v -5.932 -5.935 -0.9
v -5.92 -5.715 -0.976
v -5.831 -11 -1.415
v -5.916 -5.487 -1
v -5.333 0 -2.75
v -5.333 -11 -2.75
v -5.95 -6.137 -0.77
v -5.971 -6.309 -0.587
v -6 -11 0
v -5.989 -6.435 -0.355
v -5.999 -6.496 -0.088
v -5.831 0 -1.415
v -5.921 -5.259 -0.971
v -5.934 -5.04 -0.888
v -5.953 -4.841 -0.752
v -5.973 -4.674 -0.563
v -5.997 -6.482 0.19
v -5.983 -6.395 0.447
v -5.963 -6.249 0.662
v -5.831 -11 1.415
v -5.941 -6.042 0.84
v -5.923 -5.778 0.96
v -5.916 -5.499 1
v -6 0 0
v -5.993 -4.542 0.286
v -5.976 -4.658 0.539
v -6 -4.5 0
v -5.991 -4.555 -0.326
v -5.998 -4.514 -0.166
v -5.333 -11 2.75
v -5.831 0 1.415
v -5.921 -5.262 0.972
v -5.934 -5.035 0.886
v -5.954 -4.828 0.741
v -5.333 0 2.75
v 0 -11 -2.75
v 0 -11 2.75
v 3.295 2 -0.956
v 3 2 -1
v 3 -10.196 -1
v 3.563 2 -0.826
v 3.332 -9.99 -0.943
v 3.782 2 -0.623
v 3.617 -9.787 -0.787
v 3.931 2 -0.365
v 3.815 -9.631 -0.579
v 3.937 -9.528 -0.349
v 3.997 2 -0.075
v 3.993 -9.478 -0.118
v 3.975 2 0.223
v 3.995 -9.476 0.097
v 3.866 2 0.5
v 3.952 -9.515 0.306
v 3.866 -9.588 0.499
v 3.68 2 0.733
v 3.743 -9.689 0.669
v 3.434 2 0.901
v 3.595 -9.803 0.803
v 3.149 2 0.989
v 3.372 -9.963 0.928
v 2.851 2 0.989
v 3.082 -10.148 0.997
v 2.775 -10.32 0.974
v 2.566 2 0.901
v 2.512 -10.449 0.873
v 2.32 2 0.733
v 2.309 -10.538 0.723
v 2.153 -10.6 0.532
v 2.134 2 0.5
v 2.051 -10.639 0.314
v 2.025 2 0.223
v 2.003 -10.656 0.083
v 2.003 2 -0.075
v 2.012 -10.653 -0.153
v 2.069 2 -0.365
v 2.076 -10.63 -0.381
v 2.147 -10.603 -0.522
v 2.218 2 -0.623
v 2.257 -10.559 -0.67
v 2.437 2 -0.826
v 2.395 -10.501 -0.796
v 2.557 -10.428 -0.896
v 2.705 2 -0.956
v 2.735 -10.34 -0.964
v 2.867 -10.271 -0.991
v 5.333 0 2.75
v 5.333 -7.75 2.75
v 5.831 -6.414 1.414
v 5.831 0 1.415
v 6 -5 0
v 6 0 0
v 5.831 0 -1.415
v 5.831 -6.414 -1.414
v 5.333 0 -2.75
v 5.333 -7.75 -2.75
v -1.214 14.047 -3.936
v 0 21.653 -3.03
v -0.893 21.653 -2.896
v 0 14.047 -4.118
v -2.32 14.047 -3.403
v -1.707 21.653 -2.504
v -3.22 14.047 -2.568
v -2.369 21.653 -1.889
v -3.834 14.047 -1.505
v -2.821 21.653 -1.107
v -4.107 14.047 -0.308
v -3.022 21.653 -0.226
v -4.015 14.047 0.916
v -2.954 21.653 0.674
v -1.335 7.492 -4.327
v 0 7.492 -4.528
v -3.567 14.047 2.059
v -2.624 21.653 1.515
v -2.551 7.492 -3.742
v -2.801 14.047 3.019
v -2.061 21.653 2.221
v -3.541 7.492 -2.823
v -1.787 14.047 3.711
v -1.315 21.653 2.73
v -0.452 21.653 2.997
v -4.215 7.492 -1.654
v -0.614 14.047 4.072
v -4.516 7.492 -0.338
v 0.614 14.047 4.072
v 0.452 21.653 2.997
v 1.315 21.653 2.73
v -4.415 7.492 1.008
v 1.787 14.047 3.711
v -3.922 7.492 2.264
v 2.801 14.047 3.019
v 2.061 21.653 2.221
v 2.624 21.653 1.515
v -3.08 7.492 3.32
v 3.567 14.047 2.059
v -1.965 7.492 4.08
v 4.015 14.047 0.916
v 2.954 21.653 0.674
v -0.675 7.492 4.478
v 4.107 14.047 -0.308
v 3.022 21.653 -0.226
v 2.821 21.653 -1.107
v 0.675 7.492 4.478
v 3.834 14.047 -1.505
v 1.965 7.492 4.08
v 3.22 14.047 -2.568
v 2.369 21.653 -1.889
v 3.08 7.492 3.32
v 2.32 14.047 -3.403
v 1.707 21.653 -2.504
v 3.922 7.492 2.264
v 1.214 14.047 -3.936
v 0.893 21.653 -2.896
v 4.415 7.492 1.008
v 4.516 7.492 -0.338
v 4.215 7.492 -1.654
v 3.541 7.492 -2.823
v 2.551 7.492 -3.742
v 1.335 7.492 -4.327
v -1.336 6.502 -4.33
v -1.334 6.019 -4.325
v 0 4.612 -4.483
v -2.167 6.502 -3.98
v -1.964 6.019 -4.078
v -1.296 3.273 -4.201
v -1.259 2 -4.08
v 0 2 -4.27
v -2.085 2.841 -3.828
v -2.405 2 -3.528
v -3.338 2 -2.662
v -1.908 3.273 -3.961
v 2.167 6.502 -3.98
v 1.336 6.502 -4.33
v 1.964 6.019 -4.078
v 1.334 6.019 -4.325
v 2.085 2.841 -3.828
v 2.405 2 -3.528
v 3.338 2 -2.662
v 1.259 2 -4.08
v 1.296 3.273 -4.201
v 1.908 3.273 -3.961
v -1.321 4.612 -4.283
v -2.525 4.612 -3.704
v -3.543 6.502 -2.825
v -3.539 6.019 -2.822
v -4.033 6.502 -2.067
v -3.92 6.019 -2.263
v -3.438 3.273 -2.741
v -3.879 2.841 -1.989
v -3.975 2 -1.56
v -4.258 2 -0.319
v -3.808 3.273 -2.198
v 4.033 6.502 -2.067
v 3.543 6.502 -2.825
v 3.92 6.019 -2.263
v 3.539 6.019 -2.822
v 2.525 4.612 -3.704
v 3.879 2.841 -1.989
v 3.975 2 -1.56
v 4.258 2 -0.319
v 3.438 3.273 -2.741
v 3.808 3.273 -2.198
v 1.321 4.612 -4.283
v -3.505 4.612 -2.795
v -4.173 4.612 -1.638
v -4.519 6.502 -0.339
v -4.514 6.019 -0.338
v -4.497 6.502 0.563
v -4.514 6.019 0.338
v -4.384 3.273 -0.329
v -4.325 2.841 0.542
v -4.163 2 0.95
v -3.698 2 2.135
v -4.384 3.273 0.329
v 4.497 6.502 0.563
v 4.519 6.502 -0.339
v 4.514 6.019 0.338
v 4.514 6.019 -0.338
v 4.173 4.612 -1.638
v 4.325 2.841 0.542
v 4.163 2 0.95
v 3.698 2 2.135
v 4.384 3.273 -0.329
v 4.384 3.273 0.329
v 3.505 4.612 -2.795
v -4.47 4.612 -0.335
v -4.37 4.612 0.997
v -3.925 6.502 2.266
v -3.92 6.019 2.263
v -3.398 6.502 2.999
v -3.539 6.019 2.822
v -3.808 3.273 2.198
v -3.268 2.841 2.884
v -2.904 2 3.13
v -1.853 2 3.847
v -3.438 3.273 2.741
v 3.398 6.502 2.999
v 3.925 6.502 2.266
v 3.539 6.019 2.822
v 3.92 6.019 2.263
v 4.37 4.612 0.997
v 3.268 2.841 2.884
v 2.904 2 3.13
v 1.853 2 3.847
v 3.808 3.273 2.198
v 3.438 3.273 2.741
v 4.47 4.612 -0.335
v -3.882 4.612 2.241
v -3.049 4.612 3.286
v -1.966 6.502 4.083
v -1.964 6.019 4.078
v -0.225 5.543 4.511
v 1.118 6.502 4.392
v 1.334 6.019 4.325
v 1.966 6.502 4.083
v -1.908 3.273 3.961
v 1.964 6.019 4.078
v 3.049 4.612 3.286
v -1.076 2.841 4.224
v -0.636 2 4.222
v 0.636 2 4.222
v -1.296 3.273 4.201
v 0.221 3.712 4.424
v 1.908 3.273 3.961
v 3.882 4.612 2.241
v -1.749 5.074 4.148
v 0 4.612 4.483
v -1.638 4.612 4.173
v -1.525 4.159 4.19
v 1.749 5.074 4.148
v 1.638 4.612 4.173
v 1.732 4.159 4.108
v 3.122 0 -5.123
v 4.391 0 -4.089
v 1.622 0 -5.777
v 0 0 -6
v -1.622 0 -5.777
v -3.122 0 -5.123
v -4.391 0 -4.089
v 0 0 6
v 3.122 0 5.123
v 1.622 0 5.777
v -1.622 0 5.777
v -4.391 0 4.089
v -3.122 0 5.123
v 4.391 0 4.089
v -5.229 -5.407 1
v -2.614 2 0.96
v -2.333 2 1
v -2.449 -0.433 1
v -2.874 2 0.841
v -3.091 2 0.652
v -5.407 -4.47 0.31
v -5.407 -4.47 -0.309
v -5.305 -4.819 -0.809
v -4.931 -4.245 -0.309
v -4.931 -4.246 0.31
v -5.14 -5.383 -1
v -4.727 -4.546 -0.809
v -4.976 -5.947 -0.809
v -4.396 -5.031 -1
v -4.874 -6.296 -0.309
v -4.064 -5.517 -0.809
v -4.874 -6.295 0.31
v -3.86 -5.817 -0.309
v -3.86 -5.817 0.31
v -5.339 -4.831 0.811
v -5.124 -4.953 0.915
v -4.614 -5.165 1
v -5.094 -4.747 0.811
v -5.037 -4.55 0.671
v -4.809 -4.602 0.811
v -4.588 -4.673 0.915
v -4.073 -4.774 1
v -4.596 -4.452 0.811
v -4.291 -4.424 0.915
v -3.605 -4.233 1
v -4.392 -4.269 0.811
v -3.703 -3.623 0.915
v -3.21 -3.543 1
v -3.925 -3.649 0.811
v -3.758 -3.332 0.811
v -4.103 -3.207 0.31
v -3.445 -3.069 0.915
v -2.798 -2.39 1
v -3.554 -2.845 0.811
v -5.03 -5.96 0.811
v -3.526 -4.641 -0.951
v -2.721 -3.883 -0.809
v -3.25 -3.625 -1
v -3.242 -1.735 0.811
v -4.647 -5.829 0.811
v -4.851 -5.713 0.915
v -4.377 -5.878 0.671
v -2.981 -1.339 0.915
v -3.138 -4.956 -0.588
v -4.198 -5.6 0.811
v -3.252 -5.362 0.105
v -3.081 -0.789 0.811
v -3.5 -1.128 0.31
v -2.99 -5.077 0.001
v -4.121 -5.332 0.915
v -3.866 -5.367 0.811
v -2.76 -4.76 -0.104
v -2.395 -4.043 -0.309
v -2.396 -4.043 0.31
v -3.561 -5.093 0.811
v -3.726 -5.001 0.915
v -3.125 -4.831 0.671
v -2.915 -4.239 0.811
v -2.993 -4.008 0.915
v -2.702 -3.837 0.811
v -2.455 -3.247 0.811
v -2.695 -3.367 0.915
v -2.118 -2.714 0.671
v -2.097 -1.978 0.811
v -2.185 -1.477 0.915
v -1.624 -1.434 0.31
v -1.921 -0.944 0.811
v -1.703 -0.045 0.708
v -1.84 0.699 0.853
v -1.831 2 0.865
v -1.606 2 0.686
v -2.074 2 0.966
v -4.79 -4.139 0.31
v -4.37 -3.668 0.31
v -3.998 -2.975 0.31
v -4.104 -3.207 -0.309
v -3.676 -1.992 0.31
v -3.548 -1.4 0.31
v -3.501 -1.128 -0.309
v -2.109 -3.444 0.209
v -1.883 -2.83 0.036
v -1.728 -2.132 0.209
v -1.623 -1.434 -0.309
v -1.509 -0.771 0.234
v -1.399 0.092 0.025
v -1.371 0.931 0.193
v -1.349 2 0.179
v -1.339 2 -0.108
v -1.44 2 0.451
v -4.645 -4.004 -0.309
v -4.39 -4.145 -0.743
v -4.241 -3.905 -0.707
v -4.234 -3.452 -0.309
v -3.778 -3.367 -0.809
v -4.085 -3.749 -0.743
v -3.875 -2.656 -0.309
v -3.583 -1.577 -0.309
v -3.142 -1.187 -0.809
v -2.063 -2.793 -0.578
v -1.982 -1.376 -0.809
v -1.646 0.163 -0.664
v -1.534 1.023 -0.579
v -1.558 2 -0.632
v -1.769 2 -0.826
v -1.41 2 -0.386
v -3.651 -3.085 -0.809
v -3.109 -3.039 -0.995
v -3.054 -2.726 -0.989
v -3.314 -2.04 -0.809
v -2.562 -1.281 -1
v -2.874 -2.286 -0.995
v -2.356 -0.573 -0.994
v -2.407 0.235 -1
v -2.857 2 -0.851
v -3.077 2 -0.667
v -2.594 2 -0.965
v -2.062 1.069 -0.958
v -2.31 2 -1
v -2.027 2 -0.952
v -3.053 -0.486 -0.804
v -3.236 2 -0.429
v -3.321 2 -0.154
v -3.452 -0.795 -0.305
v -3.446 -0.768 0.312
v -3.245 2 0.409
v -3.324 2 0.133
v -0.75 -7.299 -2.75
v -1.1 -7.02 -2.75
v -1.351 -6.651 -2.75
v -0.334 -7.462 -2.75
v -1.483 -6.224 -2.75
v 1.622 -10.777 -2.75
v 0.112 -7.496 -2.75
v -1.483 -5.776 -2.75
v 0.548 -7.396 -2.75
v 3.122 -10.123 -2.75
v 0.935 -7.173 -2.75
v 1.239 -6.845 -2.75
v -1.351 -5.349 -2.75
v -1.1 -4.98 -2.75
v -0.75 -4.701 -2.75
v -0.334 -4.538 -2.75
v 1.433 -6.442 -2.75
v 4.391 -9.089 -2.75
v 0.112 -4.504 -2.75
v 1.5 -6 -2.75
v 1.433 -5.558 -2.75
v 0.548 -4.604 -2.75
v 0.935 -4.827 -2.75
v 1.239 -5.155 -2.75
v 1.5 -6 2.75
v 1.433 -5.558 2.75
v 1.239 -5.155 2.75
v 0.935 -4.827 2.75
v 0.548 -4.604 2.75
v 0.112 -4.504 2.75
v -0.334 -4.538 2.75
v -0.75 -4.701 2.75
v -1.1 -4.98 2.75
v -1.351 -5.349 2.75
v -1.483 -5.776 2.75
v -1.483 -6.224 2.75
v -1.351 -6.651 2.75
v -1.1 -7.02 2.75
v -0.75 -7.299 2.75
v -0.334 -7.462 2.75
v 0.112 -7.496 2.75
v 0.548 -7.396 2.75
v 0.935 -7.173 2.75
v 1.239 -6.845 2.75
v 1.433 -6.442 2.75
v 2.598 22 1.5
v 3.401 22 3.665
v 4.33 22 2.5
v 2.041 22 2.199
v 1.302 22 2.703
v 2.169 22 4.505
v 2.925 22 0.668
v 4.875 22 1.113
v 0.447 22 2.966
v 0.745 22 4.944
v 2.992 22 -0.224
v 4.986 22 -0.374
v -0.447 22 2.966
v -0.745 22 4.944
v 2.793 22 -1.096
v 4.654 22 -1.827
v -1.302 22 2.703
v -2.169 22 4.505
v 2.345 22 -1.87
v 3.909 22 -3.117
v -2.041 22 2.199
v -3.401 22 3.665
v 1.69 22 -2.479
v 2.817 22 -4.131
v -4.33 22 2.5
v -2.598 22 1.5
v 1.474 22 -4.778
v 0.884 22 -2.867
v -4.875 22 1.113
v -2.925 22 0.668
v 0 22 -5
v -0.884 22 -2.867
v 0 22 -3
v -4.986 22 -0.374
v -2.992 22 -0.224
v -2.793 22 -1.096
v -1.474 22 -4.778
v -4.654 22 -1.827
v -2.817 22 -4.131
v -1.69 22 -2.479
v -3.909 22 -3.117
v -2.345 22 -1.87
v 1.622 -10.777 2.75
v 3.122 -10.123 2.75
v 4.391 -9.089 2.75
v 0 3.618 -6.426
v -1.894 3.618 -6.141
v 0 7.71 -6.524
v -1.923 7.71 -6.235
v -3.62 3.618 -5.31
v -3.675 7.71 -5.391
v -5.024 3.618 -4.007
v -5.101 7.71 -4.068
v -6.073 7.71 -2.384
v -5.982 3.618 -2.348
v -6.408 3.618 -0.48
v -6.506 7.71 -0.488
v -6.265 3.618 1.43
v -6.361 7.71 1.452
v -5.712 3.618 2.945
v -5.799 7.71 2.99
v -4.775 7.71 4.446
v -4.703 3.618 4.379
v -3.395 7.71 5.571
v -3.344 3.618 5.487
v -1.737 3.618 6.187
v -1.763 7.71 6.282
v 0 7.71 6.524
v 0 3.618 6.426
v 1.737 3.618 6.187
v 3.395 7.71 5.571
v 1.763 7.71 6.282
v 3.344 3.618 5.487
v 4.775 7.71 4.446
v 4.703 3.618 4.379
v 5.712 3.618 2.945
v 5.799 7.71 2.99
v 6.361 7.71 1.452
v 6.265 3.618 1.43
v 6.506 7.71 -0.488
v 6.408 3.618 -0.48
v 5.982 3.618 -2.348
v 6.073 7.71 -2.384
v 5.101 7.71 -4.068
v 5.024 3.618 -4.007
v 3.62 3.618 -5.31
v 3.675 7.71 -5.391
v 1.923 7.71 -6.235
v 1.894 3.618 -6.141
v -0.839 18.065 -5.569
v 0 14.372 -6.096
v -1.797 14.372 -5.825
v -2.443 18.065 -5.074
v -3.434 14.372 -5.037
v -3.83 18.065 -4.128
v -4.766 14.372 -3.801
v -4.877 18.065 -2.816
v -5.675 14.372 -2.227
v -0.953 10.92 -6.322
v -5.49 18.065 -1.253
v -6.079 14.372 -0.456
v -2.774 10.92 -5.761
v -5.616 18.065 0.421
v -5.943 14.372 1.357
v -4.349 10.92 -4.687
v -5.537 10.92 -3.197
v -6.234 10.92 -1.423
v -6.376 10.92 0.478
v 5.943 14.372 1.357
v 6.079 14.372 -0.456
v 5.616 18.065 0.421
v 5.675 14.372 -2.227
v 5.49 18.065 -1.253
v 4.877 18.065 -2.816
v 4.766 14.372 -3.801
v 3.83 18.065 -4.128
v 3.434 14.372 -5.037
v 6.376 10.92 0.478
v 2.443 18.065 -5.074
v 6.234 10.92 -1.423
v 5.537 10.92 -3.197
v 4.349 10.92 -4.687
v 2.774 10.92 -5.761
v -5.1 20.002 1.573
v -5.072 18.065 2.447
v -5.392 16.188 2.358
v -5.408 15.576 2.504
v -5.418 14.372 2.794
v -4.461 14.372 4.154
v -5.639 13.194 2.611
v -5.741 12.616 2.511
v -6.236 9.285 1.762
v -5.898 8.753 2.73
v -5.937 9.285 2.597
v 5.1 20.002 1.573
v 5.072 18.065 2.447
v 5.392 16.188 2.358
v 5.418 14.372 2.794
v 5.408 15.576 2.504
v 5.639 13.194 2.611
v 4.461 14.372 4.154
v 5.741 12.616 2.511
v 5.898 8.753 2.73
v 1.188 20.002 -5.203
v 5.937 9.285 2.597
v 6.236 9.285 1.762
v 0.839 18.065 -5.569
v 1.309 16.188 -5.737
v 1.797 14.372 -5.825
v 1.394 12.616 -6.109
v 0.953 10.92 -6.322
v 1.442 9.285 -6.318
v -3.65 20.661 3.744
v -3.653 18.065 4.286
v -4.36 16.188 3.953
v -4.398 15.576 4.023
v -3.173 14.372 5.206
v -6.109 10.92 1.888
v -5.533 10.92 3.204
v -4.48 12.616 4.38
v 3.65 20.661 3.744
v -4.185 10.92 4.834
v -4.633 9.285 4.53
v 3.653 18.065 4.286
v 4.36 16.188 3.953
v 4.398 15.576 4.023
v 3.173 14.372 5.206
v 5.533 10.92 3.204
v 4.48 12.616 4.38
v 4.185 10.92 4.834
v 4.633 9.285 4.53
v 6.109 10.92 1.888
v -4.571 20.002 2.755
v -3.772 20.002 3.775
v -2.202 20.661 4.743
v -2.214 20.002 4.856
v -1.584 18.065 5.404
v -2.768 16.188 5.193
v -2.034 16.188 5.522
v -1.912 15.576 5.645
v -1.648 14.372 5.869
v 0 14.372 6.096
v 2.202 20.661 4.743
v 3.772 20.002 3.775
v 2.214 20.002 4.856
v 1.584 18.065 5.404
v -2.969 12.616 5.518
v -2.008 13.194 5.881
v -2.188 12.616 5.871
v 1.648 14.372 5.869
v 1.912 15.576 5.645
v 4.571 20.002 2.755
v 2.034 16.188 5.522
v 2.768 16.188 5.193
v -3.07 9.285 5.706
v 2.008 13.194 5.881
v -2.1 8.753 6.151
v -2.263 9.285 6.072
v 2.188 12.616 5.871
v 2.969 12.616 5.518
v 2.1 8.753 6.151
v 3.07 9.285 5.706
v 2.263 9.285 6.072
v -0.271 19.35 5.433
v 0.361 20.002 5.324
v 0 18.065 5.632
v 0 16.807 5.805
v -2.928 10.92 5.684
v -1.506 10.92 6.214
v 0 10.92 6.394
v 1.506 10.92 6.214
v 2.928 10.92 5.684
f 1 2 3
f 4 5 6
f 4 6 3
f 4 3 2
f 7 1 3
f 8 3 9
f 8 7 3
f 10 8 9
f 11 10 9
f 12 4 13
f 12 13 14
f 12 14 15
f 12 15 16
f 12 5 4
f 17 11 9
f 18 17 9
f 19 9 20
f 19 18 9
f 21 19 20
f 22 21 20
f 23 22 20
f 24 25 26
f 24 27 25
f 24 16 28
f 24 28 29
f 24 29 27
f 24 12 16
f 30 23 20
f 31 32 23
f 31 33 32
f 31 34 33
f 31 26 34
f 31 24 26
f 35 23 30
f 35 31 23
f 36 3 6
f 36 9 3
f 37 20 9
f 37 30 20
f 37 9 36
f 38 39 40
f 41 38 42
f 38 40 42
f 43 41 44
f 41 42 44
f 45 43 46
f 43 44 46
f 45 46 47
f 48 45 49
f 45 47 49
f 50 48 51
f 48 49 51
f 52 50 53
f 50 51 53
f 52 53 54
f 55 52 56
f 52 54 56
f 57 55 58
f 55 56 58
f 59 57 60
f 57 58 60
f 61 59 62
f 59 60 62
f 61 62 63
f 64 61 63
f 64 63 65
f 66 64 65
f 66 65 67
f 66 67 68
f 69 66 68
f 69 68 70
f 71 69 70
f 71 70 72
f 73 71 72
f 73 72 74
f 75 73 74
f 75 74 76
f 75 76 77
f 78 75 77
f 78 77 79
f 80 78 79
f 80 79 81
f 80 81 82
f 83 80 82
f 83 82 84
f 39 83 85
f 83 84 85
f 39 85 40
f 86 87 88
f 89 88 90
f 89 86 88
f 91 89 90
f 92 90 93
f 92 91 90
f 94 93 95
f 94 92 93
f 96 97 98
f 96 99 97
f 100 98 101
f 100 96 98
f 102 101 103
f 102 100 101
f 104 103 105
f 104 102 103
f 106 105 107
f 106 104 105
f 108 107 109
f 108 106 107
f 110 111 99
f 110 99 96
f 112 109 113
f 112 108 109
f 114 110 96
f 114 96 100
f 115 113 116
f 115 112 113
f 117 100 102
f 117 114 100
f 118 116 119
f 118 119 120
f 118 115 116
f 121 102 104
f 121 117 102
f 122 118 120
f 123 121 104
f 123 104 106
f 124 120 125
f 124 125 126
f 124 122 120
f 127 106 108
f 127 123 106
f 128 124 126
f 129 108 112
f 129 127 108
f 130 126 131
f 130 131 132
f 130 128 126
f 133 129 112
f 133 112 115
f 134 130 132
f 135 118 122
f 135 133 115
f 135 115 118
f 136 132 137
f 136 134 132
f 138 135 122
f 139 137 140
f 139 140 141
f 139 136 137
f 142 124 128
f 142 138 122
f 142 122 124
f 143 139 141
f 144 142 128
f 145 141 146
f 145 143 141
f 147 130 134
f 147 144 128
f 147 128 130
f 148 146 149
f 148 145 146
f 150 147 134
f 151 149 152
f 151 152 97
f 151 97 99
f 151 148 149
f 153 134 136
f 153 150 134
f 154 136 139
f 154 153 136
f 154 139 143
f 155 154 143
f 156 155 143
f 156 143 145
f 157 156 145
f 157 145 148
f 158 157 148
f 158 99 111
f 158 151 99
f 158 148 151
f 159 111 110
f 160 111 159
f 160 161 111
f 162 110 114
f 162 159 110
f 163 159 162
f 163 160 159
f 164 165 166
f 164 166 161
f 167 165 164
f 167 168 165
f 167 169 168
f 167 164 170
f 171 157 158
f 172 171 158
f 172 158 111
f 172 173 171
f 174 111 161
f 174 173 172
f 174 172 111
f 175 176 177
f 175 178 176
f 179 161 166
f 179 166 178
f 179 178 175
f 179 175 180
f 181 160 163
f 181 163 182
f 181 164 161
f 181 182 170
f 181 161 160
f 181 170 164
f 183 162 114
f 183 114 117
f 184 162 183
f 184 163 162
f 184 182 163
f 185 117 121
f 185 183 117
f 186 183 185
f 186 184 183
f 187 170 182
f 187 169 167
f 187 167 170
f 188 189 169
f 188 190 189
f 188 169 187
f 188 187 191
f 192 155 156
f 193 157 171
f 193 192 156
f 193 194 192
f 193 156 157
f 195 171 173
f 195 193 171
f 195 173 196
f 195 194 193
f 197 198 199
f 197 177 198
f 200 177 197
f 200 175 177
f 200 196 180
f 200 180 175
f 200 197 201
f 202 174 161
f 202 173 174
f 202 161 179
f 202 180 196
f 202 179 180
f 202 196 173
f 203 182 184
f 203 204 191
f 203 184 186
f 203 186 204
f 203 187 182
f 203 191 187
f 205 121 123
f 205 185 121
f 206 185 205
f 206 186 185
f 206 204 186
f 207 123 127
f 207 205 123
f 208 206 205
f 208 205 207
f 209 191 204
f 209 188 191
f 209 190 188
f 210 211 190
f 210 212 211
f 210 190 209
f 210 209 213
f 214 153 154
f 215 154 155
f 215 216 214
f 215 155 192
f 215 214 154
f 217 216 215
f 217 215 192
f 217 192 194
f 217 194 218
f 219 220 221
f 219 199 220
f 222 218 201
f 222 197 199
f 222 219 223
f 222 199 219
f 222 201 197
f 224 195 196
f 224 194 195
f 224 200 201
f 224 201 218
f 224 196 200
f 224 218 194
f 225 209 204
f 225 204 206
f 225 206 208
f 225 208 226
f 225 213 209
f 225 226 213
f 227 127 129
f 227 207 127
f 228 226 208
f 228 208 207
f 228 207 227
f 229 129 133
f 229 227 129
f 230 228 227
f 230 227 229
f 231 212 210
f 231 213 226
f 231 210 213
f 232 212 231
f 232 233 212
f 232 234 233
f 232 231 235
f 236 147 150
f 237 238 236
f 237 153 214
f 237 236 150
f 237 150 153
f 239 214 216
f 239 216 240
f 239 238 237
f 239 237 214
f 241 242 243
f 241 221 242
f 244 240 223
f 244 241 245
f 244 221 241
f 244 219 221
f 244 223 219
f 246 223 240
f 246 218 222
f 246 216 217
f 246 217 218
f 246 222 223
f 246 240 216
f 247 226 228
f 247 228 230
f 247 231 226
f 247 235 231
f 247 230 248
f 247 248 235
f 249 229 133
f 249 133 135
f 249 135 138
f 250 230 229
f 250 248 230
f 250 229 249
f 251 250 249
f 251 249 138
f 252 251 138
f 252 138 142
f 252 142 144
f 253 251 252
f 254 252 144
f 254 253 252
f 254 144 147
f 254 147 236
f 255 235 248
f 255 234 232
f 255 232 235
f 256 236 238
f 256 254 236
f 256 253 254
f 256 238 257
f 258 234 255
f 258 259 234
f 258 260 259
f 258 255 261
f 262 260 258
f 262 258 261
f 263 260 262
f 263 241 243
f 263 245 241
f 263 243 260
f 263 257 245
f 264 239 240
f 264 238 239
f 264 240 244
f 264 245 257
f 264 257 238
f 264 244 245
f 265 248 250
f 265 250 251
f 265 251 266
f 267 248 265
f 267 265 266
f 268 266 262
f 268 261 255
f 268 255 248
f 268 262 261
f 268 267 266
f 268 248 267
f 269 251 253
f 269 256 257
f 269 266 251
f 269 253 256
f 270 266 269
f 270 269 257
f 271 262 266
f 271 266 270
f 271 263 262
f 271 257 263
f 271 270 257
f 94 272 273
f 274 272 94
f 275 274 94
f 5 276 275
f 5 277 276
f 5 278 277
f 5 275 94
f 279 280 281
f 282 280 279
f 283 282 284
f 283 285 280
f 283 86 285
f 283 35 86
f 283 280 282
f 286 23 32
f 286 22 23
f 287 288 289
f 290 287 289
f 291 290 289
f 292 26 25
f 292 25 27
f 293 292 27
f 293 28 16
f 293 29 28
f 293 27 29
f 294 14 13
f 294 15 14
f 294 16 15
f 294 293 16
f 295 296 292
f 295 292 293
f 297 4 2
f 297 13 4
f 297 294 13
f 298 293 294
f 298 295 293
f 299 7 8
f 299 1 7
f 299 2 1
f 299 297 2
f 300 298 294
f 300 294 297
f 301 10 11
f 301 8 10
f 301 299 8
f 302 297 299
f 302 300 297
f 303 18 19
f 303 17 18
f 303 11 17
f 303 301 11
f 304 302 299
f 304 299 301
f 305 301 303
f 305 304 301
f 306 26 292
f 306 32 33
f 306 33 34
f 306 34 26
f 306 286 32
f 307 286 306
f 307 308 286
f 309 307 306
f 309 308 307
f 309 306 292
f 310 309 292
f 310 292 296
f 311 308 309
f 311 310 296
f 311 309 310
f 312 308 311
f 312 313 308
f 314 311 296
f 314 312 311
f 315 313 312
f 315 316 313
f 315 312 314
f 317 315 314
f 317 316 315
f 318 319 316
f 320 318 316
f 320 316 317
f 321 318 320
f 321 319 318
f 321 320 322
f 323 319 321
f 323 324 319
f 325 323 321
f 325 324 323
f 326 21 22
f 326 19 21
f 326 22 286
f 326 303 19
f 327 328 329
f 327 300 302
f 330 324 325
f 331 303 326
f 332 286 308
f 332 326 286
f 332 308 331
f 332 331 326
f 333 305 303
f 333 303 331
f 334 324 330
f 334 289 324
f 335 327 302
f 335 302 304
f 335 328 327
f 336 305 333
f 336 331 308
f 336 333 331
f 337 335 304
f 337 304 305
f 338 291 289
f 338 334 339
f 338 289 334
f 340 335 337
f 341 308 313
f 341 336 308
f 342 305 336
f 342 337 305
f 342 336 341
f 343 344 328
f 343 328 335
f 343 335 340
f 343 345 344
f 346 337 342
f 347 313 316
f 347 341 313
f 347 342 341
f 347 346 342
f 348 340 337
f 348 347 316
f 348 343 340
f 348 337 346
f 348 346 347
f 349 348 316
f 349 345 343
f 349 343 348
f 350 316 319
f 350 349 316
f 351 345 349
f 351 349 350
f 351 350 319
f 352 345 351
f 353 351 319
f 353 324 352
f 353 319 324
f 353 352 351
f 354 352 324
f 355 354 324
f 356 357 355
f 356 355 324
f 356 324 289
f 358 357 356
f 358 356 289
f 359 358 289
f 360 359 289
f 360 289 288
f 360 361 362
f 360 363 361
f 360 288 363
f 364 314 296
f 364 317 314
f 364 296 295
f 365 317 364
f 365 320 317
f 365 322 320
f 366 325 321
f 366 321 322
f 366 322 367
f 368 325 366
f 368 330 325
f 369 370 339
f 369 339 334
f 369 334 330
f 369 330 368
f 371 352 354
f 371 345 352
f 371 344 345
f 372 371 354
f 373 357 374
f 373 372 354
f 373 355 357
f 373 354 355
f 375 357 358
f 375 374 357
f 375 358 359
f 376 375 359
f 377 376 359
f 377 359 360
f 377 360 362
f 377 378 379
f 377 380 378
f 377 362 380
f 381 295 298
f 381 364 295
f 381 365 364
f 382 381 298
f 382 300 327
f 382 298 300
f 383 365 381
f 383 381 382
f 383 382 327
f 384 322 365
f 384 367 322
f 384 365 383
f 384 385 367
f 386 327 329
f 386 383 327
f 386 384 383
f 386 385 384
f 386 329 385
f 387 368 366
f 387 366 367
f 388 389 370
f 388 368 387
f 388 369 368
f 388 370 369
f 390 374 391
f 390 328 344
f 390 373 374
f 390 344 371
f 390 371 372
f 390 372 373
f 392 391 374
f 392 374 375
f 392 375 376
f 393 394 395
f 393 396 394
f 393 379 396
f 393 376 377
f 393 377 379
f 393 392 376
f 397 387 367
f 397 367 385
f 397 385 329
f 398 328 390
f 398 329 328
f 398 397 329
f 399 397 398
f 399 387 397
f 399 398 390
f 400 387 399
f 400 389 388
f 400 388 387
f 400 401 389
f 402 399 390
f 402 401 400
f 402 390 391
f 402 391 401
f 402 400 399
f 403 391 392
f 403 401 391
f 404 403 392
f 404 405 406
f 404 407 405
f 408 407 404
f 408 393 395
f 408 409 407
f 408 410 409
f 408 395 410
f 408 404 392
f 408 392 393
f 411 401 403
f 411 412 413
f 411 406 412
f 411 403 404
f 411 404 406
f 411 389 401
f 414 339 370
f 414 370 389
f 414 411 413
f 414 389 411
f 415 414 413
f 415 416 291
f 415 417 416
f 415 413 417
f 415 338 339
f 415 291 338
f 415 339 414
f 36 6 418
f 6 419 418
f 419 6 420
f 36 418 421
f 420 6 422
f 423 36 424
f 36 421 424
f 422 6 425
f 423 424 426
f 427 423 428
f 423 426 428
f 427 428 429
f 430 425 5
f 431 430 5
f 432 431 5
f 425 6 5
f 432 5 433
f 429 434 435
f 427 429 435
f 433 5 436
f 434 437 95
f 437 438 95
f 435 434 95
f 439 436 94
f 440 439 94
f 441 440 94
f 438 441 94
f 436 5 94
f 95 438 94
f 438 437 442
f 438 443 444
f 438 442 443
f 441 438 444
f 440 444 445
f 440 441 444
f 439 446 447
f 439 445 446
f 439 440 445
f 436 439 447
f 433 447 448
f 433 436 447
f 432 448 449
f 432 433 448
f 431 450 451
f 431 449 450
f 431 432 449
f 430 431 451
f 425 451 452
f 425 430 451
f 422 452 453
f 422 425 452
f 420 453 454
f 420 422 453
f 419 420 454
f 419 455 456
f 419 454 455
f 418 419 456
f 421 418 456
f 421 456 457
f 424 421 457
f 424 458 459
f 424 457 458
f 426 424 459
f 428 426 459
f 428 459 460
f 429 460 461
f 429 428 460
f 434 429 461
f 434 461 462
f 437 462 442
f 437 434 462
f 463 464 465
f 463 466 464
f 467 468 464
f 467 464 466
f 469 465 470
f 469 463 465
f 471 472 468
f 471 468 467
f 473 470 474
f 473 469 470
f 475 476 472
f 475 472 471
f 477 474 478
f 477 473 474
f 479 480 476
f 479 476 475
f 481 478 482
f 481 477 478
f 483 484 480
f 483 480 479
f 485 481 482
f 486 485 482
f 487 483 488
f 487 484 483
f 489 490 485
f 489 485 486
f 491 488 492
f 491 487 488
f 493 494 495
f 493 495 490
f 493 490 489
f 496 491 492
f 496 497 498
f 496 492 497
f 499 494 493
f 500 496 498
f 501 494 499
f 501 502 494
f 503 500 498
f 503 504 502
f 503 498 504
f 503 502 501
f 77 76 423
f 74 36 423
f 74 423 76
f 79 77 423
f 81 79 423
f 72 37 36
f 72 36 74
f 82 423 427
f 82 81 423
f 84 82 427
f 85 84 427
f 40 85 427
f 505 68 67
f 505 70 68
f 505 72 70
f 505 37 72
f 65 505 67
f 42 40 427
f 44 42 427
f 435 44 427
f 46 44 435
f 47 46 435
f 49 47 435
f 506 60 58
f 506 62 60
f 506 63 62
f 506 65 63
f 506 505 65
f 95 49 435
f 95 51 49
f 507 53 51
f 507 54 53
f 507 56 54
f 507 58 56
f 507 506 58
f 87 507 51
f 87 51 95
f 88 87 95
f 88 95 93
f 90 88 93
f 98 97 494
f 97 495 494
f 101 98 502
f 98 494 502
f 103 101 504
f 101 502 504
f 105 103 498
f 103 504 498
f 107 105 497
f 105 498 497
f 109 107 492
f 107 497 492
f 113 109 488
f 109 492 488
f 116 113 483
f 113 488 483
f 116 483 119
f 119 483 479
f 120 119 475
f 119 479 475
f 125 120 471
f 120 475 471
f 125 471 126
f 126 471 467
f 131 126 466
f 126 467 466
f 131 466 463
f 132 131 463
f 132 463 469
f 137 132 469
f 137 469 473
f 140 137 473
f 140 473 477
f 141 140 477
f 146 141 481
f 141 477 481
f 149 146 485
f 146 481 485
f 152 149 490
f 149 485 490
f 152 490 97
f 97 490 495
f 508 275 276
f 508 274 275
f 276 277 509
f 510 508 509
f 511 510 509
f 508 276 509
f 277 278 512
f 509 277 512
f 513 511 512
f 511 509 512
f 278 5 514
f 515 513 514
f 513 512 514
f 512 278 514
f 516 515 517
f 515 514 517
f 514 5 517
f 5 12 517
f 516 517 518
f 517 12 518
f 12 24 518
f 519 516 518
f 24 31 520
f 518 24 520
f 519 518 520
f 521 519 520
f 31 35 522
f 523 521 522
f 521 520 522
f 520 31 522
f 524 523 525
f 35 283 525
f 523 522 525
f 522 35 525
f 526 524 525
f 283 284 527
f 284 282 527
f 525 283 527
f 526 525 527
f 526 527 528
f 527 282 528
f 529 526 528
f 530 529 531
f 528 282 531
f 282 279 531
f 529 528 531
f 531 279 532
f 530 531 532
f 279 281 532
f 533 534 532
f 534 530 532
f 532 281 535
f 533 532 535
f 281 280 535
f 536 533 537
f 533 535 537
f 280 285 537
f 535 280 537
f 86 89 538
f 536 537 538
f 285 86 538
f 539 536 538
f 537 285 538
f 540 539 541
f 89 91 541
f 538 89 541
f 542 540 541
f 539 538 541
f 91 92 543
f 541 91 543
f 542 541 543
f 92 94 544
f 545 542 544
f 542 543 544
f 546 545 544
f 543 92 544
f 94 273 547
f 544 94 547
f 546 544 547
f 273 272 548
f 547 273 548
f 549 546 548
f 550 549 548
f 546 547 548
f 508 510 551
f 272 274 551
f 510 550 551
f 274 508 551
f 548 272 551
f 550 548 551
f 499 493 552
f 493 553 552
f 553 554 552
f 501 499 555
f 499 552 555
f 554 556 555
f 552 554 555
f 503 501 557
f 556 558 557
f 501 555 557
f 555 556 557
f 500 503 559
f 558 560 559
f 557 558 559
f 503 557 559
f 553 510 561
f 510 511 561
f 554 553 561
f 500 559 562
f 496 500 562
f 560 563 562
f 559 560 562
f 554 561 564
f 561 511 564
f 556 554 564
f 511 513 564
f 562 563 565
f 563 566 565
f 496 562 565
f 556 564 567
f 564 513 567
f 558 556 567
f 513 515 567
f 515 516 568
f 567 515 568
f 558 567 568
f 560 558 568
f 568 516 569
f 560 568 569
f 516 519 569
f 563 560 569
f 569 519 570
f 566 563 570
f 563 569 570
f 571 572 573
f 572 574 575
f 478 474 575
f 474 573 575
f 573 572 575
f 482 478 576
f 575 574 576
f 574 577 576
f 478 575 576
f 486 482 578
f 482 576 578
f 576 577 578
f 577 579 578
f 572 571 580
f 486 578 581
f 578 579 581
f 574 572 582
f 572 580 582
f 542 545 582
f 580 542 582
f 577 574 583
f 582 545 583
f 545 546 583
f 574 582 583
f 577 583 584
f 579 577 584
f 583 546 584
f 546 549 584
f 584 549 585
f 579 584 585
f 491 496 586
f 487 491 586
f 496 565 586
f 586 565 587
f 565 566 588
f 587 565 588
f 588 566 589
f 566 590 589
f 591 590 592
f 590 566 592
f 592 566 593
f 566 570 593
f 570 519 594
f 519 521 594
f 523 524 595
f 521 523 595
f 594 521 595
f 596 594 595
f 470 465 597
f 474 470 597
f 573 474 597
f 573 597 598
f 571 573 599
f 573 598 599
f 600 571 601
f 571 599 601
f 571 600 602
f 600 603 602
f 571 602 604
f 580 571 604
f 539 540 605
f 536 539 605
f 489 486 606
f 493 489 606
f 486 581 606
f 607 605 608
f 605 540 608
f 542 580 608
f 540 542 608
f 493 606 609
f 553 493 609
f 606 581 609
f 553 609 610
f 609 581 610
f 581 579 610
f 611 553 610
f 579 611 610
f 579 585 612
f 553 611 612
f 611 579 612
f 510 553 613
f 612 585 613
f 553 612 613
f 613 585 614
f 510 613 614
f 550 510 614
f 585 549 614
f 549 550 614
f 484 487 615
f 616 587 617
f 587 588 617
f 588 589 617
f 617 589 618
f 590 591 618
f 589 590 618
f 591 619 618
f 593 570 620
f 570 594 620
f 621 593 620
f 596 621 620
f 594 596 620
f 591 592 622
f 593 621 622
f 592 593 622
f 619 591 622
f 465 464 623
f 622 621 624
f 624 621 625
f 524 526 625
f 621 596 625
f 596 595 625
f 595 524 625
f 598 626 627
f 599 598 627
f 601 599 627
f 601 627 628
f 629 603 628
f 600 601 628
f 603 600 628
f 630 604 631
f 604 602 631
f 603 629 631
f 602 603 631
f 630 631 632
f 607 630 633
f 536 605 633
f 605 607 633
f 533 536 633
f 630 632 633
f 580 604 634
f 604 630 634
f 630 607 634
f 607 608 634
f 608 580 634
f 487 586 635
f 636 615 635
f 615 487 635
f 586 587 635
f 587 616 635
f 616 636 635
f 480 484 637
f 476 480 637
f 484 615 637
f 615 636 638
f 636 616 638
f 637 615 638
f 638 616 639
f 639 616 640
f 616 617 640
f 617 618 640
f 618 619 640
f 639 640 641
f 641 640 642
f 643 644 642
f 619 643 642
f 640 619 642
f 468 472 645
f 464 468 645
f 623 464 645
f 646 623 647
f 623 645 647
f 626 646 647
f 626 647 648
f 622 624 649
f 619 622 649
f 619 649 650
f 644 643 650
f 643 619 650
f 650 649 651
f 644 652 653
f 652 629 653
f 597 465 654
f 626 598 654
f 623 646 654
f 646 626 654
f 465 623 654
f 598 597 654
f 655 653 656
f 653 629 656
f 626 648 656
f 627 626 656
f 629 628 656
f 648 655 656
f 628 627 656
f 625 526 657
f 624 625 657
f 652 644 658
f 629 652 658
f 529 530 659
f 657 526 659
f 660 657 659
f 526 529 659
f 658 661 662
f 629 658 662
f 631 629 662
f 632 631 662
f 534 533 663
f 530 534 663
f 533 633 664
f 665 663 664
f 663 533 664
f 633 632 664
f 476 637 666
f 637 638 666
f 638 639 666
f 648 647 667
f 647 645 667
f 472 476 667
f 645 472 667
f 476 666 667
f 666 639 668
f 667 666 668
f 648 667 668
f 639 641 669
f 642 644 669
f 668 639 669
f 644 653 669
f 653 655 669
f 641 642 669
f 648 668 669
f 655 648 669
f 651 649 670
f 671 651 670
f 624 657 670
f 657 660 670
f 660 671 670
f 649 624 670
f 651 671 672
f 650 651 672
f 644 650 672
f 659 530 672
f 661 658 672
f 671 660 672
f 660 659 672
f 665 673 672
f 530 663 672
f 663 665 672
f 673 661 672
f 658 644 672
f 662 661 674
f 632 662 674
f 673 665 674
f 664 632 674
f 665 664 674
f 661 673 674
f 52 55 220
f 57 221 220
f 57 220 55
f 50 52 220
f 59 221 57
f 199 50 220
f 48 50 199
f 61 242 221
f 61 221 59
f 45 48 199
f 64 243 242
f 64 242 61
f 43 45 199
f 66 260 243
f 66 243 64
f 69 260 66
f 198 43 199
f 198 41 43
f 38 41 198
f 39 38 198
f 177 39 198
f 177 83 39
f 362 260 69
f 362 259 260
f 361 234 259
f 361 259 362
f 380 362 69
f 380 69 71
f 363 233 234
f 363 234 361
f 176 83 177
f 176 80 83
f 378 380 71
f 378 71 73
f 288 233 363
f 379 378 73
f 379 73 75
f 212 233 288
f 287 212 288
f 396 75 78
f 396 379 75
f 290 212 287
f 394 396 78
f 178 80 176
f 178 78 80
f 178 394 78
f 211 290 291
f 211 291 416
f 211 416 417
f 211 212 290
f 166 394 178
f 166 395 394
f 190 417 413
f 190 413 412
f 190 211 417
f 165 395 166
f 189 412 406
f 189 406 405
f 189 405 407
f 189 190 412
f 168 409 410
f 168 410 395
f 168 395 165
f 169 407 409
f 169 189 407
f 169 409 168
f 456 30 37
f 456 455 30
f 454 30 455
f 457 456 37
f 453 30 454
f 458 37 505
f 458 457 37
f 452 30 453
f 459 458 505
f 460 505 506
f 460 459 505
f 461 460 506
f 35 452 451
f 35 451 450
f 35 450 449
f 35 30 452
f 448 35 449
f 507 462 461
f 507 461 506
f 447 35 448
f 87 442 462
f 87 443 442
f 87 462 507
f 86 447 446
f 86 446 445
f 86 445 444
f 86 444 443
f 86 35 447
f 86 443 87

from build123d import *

# Parameters (mm, degrees)
BOSS_EXTRUDE1_DEPTH     = 2.75
CUT_EXTRUDE5_DEPTH      = 14
CUT_EXTRUDE5_DEPTH_BACK = 14
SKETCH5_R               = 1.5
SKETCH6_OUTSIDE_W       = 22.626
SKETCH6_OUTSIDE_H       = 22.626
SKETCH6_OUTSIDE_R       = 6
CUT_EXTRUDE6_DEPTH      = 24.860169667
SKETCH7_R               = 1
CUT_EXTRUDE7_DEPTH      = 20
SKETCH8_R               = 1


with BuildPart() as part:
    # Sketch1 → Revolve1 (revolve)
    with BuildSketch(Plane(origin=(0, 0, 0), x_dir=(0, 0, -1), z_dir=(1, 0, 0))):
        with BuildLine():
            Line((0, 2), (0, 0))
            Line((0, 0), (6, 0))
            add(Edge.make_bspline(
                [(5, 22), (7.432624423, 8.203901334), (6, 0)],
                knots=[0, 0, 0, 1, 1, 1], degree=2))
            Line((5, 22), (3, 22))
            add(Edge.make_bspline(
                [(3.030384494, 21.652703645), (3.016873864, 21.729326237), (3, 22)],
                knots=[0, 0, 0, 1, 1, 1], degree=2))
            add(Edge.make_bspline(
                [(3.030384494, 21.652703645), (3.725648232, 17.709667047), (4.838461357, 7.341433009), (4.295069583, 2.215324441), (4.269810085, 2)],
                knots=[0, 0, 0, 0.289998028, 0.869994084, 0.895995268, 0.895995268, 0.895995268], degree=2))
            Line((4.269810085, 2), (0, 2))
        make_face()
    revolve(axis=Axis((0, 0, 0), (0, 1, 0)))

    # Sketch3 → Boss-Extrude1 (add, symmetric)
    with BuildSketch(Plane.XY):
        with BuildLine():
            Line((-6, 0), (-6, -11))
            Line((-6, -11), (0, -11))
            ThreePointArc((0, -11), (4.242640687, -9.242640687), (6, -5))
            Line((6, -5), (6, 0))
            Line((6, 0), (-6, 0))
        make_face()
    extrude(amount=BOSS_EXTRUDE1_DEPTH, both=True)

    # Sketch5 → Cut-Extrude5 (cut, two sides: drawn at the far end of the back side and taken through both)
    with BuildSketch(Plane.XY.offset(-CUT_EXTRUDE5_DEPTH_BACK)):
        with Locations((0, -6)):
            Circle(SKETCH5_R)
    extrude(amount=CUT_EXTRUDE5_DEPTH + CUT_EXTRUDE5_DEPTH_BACK, mode=Mode.SUBTRACT)

    # Sketch6 outside → Cut-Extrude6 (cut, through all)
    with BuildSketch(Plane(origin=(0, 0, 0), x_dir=(1, 0, 0), z_dir=(0, 1, 0))):
        Rectangle(SKETCH6_OUTSIDE_W, SKETCH6_OUTSIDE_H)
        Circle(SKETCH6_OUTSIDE_R, mode=Mode.SUBTRACT)
    extrude(amount=-CUT_EXTRUDE6_DEPTH, mode=Mode.SUBTRACT)

    # Sketch7 → Cut-Extrude7 (cut)
    with BuildSketch(Plane.XZ.offset(11)):
        with Locations(Location((3, 0, 0), (0, 0, 270))):
            Circle(SKETCH7_R)
    extrude(amount=-CUT_EXTRUDE7_DEPTH, mode=Mode.SUBTRACT)

    # Cut-Sweep1: sweep along a path in Sketch10
    with BuildLine() as cut_sweep1_path:  # in the path sketch's own coordinates; laid on its plane below (add() does not lay a ready-made edge on the line's plane)
        add(Edge.make_bspline(
            [(-6, -5.5), (-2.332682252, -5.5), (-2.332682252, 2)],
            knots=[0, 0, 0, 1, 1, 1], degree=2))
    # Sketch8 → Cut-Sweep1 (sweep, cut)
    with BuildSketch(Plane.ZY.offset(6)):
        with Locations((0, -5.5)):
            Circle(SKETCH8_R)
    sweep(path=Plane.XY * cut_sweep1_path.line, mode=Mode.SUBTRACT)


solid = part.part
